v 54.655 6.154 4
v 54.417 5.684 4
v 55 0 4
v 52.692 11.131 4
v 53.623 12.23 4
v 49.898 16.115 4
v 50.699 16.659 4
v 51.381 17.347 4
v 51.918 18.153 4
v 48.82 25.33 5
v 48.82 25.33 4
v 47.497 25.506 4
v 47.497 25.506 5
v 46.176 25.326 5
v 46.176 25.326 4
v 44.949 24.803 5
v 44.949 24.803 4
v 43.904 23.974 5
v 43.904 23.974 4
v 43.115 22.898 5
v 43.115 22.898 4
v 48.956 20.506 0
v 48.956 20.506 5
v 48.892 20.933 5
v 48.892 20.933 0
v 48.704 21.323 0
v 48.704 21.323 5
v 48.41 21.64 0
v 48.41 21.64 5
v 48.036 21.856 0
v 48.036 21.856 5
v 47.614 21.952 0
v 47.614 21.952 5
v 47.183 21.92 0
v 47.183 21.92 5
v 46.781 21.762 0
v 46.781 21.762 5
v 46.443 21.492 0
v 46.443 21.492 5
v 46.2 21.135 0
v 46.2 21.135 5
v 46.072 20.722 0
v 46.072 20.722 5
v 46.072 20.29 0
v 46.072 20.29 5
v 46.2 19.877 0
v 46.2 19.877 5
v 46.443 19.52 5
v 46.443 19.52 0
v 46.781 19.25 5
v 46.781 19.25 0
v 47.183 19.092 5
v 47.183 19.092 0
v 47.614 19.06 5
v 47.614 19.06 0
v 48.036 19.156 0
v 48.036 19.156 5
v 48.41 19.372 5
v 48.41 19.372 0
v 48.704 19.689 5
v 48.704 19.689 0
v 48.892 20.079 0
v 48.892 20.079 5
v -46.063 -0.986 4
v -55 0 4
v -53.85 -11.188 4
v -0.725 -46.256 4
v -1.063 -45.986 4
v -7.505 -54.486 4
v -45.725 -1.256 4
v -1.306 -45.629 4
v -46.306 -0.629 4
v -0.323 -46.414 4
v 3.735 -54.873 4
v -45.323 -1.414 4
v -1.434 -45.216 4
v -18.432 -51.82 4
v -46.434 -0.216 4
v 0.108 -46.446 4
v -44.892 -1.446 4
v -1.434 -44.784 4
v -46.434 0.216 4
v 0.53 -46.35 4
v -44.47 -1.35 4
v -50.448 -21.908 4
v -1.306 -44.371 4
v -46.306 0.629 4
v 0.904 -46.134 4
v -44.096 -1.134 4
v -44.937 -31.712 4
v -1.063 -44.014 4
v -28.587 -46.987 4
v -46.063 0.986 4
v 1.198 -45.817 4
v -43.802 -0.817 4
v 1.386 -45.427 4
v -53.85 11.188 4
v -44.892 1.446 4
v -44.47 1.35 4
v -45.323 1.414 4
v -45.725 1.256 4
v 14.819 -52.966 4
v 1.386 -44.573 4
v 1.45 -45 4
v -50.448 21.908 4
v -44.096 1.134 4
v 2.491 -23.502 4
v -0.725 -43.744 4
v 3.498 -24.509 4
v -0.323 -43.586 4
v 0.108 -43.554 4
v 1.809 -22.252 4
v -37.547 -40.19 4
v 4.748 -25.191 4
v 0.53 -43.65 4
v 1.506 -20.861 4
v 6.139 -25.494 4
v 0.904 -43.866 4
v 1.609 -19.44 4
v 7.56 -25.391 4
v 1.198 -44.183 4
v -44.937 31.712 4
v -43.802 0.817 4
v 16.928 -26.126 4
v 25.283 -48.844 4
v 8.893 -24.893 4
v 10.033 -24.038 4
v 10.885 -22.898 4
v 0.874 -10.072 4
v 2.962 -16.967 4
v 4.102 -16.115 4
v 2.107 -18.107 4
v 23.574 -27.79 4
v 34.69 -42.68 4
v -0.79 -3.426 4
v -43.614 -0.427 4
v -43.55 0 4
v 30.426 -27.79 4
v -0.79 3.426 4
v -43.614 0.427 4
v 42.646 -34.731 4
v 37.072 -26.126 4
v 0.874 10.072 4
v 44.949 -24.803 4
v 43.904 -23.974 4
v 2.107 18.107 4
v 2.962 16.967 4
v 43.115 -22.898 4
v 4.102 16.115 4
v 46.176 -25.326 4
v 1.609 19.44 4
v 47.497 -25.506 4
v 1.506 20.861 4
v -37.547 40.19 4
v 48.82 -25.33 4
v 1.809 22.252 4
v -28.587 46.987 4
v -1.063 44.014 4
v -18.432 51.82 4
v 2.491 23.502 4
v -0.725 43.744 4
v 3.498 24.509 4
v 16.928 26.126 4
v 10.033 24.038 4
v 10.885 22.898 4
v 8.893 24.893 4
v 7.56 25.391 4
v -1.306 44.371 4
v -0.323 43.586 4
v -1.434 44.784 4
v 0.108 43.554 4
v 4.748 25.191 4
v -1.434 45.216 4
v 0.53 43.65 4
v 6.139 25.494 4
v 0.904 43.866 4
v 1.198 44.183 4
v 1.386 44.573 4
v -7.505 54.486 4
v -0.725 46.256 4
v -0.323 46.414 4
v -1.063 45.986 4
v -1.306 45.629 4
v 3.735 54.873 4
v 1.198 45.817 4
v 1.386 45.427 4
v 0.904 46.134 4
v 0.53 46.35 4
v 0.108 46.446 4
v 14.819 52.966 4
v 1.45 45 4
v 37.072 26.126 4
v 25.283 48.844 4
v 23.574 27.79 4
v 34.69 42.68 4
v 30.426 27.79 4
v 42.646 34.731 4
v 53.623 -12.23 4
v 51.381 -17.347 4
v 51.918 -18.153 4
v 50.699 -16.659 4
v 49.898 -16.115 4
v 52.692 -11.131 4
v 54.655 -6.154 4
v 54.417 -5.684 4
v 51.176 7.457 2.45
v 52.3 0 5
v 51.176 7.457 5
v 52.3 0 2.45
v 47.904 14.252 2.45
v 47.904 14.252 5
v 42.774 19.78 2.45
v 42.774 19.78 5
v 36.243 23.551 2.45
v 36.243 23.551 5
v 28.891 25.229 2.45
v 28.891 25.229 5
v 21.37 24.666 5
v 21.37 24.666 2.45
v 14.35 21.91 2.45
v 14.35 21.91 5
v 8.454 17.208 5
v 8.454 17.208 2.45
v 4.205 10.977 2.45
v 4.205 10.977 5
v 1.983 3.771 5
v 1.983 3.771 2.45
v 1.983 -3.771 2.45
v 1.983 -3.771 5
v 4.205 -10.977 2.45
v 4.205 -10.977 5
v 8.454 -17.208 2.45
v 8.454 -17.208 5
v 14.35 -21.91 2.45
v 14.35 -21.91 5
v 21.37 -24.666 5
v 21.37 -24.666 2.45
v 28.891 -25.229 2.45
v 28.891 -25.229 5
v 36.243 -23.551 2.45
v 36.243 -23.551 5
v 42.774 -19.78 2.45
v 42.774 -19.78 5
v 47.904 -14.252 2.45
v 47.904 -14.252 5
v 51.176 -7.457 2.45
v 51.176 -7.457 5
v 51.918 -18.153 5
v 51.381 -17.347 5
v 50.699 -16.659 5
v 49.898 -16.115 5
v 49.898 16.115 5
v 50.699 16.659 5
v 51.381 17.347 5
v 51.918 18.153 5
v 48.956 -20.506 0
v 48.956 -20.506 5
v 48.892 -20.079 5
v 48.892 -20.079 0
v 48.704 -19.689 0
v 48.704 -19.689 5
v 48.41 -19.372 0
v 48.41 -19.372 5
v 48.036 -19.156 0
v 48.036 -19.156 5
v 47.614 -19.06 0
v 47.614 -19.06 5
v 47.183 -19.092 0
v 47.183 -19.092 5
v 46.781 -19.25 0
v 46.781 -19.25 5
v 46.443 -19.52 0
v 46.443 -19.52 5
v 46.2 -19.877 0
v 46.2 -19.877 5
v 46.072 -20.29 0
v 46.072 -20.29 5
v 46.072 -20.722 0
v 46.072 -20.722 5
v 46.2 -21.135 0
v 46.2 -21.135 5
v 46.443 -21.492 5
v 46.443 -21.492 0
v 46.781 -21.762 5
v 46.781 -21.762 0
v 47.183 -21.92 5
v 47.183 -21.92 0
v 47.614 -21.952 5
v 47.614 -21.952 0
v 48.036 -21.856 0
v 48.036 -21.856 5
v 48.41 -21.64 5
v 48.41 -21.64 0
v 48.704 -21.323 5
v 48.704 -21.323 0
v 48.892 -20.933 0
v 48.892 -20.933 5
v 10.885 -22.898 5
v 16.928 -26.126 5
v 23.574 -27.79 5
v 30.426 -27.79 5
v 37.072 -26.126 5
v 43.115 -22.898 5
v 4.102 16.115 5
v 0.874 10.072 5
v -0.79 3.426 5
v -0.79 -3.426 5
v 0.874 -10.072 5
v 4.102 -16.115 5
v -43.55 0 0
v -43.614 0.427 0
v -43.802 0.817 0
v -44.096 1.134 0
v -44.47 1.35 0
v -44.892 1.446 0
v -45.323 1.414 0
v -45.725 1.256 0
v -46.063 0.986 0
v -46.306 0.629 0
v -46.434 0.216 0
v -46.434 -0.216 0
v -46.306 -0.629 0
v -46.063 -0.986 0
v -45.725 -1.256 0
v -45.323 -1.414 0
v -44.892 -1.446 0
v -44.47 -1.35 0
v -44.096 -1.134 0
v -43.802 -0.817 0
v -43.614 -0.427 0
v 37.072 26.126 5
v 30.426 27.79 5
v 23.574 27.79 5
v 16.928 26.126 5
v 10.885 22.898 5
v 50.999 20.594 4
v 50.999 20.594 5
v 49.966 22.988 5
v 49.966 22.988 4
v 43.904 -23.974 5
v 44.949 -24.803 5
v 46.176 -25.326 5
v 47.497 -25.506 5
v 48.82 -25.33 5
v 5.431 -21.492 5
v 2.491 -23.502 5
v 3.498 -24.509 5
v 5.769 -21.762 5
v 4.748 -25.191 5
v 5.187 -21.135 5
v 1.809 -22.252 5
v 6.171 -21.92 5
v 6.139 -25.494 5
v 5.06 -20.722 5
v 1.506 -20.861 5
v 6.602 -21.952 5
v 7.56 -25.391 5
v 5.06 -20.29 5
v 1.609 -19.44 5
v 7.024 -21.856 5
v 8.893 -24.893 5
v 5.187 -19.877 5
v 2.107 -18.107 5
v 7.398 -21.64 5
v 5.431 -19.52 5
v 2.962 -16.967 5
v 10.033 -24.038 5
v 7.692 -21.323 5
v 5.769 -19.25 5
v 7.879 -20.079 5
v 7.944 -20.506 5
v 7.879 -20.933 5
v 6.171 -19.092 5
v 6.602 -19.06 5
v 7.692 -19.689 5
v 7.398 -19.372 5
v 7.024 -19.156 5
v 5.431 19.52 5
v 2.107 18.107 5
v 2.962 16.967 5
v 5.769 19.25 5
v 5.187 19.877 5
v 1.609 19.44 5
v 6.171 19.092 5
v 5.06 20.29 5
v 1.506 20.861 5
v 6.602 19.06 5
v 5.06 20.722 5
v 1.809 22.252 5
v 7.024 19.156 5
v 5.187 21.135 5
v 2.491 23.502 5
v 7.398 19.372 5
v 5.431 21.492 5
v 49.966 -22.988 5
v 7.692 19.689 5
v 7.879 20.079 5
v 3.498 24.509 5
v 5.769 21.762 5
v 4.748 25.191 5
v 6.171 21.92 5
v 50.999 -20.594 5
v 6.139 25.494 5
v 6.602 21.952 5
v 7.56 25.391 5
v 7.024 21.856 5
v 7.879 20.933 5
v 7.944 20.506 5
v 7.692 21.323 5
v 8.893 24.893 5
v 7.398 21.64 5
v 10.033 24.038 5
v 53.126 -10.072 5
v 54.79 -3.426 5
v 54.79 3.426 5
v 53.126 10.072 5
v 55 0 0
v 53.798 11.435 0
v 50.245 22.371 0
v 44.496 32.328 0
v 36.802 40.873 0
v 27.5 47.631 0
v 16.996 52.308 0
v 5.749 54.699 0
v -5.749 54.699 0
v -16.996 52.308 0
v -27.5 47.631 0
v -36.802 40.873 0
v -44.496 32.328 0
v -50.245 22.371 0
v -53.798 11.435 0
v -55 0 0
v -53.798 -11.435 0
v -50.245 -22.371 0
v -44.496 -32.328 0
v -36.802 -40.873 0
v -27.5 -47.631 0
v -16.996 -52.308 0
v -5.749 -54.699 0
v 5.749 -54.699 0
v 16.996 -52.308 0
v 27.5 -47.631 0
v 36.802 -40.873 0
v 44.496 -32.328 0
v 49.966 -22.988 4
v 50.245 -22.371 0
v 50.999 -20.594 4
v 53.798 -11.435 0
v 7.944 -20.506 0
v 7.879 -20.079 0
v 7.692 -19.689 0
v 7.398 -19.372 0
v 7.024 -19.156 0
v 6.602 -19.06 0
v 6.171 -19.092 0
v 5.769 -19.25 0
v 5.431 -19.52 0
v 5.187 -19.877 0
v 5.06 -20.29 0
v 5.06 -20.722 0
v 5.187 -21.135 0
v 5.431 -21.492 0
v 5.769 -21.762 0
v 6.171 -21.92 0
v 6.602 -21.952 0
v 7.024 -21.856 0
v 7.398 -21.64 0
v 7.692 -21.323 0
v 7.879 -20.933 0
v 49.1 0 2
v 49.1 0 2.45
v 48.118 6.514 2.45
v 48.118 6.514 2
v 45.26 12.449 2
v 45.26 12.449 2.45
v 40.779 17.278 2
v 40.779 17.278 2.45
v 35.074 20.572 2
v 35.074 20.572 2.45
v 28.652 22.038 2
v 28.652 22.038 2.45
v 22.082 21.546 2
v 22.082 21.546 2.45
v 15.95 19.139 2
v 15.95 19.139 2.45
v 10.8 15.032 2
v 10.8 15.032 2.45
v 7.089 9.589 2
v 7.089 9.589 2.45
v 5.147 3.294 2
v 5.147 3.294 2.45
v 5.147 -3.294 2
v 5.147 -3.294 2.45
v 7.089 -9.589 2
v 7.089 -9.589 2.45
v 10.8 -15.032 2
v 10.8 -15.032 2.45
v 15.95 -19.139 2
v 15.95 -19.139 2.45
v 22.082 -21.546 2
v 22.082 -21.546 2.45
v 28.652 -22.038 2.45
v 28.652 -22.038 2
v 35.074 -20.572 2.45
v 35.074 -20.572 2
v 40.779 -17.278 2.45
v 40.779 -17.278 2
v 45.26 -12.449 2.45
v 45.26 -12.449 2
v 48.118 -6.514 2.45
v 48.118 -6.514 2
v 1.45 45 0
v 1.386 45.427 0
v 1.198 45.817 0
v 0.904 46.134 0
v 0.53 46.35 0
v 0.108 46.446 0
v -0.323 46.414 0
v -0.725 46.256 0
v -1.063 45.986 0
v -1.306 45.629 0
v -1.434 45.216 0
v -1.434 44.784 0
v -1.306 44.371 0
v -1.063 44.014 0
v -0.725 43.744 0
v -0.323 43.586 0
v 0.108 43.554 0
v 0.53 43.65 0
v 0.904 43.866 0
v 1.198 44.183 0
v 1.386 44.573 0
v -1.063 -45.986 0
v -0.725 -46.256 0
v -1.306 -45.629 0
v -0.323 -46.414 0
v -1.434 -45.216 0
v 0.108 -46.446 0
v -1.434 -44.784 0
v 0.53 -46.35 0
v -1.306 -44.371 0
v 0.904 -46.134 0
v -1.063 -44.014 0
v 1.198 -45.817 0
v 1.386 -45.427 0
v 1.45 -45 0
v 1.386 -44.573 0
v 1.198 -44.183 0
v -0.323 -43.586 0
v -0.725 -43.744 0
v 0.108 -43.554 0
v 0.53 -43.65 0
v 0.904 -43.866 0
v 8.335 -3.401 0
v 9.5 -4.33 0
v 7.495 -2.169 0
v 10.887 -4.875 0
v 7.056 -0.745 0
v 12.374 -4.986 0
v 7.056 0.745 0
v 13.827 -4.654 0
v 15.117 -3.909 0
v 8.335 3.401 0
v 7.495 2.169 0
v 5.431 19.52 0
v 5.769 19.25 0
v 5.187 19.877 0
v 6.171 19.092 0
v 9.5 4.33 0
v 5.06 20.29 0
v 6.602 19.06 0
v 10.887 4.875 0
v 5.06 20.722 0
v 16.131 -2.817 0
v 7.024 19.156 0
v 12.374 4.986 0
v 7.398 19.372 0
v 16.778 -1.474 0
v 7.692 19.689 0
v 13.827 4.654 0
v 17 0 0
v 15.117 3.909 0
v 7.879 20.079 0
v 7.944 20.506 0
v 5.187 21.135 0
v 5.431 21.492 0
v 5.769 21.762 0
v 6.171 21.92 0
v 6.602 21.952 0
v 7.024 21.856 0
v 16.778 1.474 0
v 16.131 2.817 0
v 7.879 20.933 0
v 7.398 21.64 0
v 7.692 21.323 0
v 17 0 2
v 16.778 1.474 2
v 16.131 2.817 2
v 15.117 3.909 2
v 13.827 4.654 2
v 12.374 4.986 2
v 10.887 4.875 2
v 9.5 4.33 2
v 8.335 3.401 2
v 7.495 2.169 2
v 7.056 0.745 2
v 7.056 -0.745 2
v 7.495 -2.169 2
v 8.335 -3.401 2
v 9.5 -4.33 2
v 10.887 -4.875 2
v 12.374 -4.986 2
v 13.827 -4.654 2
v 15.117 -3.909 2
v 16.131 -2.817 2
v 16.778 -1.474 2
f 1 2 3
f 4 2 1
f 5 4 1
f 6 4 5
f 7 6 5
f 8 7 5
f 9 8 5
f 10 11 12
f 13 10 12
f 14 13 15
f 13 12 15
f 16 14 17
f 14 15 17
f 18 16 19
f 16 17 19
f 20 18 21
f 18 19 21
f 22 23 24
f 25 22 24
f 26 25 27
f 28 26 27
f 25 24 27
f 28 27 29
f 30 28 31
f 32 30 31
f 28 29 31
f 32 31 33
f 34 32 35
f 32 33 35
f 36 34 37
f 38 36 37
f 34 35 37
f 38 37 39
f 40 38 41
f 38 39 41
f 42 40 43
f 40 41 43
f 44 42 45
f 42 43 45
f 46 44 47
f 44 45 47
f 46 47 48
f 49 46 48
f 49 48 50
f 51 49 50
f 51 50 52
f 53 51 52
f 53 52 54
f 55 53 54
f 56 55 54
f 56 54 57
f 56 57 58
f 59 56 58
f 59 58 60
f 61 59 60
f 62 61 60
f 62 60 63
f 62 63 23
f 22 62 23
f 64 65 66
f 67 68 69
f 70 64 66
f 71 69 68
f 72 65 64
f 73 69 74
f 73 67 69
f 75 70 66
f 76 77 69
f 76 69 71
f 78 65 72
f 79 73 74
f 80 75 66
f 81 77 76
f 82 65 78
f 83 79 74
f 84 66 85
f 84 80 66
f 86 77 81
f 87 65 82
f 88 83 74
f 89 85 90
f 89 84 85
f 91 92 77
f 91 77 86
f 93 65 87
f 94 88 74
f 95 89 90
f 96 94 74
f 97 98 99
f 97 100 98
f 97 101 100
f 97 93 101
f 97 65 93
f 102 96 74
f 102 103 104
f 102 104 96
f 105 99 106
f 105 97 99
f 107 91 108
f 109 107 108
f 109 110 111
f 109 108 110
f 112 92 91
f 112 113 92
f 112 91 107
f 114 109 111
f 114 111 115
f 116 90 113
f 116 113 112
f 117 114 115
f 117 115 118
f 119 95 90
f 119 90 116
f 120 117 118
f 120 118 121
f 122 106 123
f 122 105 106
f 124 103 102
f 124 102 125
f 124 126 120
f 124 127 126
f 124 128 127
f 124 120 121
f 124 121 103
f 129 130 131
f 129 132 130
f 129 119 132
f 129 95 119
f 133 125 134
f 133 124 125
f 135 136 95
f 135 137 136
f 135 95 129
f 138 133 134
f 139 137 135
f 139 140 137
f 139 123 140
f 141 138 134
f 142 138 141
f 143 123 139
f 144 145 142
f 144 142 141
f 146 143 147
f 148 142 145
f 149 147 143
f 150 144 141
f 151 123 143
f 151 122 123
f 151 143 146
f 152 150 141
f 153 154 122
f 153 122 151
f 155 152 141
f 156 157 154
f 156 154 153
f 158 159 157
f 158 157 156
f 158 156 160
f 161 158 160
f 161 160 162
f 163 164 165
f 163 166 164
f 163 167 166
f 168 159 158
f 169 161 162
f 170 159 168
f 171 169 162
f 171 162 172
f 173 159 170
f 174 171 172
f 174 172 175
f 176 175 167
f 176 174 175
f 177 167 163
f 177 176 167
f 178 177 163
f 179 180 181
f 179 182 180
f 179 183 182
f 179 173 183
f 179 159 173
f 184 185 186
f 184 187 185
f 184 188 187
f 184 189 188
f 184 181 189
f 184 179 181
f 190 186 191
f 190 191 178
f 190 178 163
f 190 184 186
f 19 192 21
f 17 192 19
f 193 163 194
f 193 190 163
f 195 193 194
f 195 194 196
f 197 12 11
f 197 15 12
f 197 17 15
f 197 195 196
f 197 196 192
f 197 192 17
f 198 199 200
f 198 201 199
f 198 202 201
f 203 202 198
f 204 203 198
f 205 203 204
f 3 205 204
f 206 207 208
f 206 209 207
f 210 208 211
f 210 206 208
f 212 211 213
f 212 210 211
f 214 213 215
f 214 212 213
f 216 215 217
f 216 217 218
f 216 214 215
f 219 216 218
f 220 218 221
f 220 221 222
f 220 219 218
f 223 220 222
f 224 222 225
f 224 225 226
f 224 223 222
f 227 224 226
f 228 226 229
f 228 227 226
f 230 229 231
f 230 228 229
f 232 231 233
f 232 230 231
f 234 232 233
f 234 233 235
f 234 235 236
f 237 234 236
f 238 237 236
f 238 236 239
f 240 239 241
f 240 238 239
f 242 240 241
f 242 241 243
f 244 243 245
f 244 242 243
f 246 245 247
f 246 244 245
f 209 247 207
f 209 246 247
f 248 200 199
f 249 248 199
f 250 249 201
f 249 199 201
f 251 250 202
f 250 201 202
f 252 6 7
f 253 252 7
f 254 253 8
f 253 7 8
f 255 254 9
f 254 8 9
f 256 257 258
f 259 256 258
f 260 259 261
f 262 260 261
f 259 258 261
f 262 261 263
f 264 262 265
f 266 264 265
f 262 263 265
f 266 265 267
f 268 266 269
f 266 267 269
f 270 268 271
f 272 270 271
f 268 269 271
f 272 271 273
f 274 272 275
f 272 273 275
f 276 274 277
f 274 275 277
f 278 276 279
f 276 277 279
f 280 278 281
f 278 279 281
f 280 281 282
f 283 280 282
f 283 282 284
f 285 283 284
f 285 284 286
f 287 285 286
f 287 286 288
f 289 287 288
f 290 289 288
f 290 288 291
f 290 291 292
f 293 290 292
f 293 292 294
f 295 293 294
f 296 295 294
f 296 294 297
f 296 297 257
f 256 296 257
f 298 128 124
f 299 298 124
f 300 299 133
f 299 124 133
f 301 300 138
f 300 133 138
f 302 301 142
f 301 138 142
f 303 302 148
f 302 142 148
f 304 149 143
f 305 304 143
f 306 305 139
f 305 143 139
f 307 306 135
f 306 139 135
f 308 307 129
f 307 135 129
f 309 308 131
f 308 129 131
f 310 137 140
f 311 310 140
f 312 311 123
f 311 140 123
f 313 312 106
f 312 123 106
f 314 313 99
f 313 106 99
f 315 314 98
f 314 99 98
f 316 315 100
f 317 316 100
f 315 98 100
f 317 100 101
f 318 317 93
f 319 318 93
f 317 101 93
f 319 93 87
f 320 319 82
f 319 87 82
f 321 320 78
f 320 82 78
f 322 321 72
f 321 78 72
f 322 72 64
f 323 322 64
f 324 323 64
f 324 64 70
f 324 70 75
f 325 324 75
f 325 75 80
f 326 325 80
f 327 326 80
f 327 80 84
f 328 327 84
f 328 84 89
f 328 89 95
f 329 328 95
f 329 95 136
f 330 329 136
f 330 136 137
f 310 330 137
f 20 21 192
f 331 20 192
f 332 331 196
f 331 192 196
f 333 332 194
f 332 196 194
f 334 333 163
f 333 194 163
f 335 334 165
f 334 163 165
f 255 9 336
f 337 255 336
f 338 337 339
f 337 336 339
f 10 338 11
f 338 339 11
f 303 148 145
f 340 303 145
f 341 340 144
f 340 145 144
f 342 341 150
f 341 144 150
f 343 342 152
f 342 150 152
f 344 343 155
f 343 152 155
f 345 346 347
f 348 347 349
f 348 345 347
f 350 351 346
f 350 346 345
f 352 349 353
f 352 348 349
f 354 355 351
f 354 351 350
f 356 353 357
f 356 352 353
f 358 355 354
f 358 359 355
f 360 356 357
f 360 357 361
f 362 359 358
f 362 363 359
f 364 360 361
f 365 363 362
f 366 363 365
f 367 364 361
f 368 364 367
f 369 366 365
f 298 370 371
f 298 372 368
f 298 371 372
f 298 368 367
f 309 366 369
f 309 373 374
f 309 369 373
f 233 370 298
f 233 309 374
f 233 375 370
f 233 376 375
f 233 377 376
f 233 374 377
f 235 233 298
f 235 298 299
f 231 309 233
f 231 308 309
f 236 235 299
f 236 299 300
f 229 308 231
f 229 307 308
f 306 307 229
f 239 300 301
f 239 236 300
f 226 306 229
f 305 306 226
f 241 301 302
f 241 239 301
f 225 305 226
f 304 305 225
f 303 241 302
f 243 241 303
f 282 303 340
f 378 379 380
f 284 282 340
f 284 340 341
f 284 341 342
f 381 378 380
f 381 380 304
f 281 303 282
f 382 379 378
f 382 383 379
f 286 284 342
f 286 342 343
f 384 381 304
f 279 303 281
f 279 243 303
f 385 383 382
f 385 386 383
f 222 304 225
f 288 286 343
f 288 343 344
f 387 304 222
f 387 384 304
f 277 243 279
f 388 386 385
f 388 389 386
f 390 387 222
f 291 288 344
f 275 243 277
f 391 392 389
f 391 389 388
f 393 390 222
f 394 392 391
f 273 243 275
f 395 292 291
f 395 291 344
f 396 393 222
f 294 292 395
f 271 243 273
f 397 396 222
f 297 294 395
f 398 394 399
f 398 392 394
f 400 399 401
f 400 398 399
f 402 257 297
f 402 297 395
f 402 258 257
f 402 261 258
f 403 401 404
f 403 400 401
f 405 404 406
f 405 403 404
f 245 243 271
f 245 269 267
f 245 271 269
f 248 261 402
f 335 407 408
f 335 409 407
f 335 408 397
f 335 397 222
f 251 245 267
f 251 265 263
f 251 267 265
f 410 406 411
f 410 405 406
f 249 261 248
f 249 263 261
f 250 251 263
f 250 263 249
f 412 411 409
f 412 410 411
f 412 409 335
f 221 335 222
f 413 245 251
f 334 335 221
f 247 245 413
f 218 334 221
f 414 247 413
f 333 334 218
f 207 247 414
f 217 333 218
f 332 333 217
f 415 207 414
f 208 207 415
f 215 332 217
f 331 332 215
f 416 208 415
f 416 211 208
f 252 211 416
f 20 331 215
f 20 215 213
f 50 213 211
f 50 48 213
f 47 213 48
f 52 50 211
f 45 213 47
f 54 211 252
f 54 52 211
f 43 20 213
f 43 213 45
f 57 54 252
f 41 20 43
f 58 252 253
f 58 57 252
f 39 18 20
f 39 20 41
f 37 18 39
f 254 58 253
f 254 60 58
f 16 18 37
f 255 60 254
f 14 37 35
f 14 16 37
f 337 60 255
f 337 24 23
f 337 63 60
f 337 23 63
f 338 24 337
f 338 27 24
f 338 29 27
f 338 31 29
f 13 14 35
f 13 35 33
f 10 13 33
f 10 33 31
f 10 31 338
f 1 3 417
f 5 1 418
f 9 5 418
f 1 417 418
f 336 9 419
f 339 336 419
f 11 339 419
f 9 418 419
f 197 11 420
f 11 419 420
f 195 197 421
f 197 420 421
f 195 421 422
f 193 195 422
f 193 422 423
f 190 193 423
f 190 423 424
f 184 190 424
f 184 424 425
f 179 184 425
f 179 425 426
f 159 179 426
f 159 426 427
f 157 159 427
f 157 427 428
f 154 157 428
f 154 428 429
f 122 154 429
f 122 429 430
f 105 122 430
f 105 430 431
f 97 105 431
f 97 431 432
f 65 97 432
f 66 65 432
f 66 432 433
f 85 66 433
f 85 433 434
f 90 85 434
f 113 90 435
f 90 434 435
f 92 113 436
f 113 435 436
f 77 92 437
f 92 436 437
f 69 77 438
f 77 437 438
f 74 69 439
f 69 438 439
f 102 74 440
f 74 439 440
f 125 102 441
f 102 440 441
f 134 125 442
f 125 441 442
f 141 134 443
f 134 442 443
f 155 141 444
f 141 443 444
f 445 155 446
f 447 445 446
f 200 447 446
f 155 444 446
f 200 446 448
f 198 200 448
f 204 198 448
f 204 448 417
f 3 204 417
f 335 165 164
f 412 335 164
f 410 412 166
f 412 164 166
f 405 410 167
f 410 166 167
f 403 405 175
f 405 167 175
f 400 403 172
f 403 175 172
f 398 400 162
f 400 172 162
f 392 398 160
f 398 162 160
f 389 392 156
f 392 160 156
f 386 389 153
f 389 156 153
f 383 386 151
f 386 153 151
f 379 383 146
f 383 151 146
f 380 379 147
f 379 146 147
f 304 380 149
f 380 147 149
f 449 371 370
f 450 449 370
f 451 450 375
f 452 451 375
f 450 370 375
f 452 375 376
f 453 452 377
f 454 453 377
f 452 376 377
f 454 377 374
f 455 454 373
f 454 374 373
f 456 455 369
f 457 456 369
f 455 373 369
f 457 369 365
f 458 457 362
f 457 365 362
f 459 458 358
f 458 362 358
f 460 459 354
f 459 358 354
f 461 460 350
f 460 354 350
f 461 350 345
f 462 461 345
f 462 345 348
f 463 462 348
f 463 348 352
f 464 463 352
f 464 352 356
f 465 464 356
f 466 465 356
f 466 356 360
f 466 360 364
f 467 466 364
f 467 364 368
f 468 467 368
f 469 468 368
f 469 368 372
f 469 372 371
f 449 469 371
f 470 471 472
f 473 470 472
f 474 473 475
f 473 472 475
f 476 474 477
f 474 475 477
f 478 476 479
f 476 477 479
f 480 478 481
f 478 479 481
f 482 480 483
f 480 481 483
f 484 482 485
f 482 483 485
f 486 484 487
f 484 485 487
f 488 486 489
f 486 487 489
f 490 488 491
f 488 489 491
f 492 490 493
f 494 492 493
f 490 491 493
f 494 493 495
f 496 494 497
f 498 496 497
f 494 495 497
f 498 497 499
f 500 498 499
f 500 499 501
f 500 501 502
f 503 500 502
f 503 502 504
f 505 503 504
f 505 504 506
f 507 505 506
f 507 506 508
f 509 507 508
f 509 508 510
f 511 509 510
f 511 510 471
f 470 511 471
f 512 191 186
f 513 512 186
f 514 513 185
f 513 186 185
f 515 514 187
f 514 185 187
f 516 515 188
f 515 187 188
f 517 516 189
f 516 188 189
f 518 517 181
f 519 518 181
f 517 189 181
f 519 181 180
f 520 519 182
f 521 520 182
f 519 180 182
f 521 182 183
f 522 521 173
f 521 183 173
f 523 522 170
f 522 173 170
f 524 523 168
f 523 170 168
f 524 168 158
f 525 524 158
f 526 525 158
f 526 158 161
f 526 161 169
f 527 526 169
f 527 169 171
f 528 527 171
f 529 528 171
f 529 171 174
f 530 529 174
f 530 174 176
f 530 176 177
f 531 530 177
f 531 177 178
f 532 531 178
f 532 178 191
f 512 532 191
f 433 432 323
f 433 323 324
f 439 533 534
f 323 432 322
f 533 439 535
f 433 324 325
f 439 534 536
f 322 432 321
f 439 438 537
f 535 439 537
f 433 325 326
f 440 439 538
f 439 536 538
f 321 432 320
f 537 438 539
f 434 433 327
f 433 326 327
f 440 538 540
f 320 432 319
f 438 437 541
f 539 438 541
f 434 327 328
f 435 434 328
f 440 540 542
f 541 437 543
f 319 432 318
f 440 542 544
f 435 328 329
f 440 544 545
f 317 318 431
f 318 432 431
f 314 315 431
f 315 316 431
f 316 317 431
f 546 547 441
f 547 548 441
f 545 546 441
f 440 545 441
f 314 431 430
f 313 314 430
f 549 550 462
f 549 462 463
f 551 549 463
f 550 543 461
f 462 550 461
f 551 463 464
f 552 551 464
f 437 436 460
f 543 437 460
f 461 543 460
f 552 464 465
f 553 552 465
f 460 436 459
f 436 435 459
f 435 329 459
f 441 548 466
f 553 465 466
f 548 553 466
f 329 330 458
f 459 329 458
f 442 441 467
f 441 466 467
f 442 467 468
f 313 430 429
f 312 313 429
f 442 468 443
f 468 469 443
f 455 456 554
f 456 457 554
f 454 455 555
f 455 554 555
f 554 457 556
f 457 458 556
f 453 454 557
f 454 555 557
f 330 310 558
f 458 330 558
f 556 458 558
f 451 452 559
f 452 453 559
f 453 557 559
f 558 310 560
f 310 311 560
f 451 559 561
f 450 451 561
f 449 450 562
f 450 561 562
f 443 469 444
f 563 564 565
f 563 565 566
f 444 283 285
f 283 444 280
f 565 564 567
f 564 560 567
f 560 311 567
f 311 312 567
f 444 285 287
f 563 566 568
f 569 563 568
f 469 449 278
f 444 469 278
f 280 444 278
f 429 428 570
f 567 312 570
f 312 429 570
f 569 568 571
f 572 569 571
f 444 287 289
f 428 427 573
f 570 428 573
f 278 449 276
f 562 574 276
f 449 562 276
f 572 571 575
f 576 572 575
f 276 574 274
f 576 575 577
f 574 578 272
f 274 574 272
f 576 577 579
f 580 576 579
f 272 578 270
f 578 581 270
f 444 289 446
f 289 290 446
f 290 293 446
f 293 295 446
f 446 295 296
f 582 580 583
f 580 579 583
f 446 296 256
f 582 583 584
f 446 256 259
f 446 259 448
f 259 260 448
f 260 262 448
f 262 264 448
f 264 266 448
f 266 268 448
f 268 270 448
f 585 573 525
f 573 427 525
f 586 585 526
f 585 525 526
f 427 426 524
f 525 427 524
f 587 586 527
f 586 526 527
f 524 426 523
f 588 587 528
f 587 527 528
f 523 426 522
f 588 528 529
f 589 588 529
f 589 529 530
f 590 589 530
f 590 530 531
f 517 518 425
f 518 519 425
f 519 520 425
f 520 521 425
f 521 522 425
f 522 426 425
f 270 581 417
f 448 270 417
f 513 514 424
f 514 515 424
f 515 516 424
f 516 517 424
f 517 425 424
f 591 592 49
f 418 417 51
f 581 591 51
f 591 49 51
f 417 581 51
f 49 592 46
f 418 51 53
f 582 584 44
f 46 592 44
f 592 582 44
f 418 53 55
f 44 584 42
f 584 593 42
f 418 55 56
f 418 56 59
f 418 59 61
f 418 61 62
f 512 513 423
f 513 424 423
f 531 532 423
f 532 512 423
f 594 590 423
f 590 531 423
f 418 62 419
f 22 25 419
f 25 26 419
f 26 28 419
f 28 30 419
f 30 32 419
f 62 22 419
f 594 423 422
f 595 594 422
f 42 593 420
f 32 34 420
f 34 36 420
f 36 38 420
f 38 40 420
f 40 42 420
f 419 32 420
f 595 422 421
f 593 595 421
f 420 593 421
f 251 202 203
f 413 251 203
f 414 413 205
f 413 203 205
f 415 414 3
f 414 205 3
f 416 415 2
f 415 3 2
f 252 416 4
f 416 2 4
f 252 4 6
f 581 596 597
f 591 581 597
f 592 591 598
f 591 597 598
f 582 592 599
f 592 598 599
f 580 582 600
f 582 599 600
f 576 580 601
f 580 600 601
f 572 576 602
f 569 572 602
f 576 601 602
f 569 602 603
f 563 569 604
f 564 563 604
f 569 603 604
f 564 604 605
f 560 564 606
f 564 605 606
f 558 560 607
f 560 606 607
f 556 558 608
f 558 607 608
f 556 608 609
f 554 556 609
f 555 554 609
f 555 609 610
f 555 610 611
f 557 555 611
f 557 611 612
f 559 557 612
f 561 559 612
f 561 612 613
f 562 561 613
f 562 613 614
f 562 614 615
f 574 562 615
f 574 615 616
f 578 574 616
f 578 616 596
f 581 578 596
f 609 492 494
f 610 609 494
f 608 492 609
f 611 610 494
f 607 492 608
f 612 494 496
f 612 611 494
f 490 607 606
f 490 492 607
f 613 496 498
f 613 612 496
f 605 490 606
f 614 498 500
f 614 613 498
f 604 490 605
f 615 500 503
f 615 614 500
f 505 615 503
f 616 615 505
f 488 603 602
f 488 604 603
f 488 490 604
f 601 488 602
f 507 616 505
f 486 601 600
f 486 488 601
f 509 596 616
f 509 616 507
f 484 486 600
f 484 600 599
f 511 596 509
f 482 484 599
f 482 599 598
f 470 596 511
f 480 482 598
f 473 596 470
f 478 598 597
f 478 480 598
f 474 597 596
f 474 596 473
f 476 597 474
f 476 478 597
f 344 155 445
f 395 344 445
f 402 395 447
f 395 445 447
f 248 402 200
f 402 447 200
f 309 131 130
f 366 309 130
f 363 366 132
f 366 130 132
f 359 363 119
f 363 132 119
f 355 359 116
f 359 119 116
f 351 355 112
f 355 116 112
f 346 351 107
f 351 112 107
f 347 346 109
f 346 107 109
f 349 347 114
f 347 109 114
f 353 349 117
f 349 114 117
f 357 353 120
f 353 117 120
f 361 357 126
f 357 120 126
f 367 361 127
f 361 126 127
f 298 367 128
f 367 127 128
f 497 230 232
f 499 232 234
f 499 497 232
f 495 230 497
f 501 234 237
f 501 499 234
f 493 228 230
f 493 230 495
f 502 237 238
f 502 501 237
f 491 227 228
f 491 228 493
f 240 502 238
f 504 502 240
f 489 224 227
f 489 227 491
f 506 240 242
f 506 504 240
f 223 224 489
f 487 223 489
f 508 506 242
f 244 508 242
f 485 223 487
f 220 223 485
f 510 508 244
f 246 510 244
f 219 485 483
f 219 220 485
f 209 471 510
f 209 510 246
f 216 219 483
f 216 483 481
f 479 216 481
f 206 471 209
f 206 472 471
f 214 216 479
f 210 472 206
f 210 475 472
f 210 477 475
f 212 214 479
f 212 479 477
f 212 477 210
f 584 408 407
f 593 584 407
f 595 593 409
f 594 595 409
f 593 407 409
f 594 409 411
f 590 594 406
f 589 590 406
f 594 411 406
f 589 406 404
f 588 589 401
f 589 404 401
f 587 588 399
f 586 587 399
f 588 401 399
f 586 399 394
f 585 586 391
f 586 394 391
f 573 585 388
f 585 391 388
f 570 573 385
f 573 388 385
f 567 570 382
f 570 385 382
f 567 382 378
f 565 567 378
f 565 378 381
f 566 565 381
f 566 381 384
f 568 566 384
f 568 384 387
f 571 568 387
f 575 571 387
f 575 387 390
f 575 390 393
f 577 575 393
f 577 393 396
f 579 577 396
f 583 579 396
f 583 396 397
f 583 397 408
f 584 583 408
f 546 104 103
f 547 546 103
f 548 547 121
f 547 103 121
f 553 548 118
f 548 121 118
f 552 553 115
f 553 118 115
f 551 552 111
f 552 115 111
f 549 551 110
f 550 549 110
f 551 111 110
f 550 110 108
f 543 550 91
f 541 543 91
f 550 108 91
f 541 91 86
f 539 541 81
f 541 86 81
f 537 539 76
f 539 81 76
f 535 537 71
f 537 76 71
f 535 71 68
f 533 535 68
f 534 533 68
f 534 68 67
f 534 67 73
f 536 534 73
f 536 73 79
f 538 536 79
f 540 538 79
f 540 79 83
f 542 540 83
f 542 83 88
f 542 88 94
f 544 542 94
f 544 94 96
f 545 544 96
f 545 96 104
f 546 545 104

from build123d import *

# Parameters (mm, degrees)
F0_R      = 55
F1_DEPTH  = 4
F2_R      = 22.1
F3_DEPTH  = 2
F4_R      = 25.3
F4_R_2    = 22.1
F5_DEPTH  = 1.55
F6_R      = 28
F6_R_2    = 25.3
F7_DEPTH  = 1
F8_R      = 5
F9_DEPTH  = 25
F11_DEPTH = 1
F12_R     = 1.45
F13_DEPTH = 25
F14_R     = 1.45
F15_DEPTH = 25


with BuildPart() as f1:
    # F0 (on Top) → F1 (new body)
    with BuildSketch(Plane.XY):
        Circle(F0_R)
    extrude(amount=F1_DEPTH)

    # F2 (on face) → F3 (cut)
    with BuildSketch(Plane.XY.offset(4)):
        with Locations((27, 0)):
            Circle(F2_R)
    extrude(amount=-F3_DEPTH, mode=Mode.SUBTRACT)

    # F4 (on face) → F5 (cut)
    with BuildSketch(Plane.XY.offset(4)):
        with Locations((27, 0)):
            Circle(F4_R)
        with Locations((27, 0)):
            Circle(F4_R_2, mode=Mode.SUBTRACT)
    extrude(amount=-F5_DEPTH, mode=Mode.SUBTRACT)

    # F6 (on face) → F7 (join)
    with BuildSketch(Plane.XY.offset(4)):
        with Locations((27, 0)):
            Circle(F6_R)
        with Locations((27, 0)):
            Circle(F6_R_2, mode=Mode.SUBTRACT)
    extrude(amount=F7_DEPTH)

    # F8 (on face) → F9 (cut)
    with BuildSketch(Plane.XY.offset(2)):
        with Locations((12, 0)):
            Circle(F8_R)
    extrude(amount=-F9_DEPTH, mode=Mode.SUBTRACT)

    # F10 (on face) → F11 (join)
    with BuildSketch(Plane.XY.offset(4)):
        with BuildLine():
            ThreePointArc((10.8848586854, -22.8976466129), (7.2010101268, -19.7989898732), (4.1023533871, -16.1151413146))
            ThreePointArc((4.1023533871, -16.1151413146), (2.9583694397, -24.0416305603), (10.8848586854, -22.8976466129))
        make_face()
        with BuildLine():
            ThreePointArc((10.8848586854, 22.8976466129), (2.9583694397, 24.0416305603), (4.1023533871, 16.1151413146))
            ThreePointArc((4.1023533871, 16.1151413146), (7.2010101268, 19.7989898732), (10.8848586854, 22.8976466129))
        make_face()
        with BuildLine():
            ThreePointArc((49.8976466129, -16.1151413146), (46.7989898732, -19.7989898732), (43.1151413146, -22.8976466129))
            ThreePointArc((43.1151413146, -22.8976466129), (45.5447053375, -25.105329645), (48.8197581332, -25.3304404978))
            ThreePointArc((48.8197581332, -25.3304404978), (50.4964850216, -21.7969034605), (51.917853321, -18.1531404043))
            ThreePointArc((51.917853321, -18.1531404043), (51.0570972643, -16.9860974117), (49.8976466129, -16.1151413146))
        make_face()
        with BuildLine():
            ThreePointArc((48.8197581332, 25.3304404978), (45.5447053375, 25.105329645), (43.1151413146, 22.8976466129))
            ThreePointArc((43.1151413146, 22.8976466129), (46.7989898732, 19.7989898732), (49.8976466129, 16.1151413146))
            ThreePointArc((49.8976466129, 16.1151413146), (51.0570972643, 16.9860974117), (51.917853321, 18.1531404043))
            ThreePointArc((51.917853321, 18.1531404043), (50.4964850216, 21.7969034605), (48.8197581332, 25.3304404978))
        make_face()
    extrude(amount=F11_DEPTH)

    # F12 (on face) → F13 (cut)
    with BuildSketch(Plane.XY.offset(5)):
        with Locations((6.4939033456, 20.5060966544)):
            Circle(F12_R)
        with Locations((47.5060966544, 20.5060966544)):
            Circle(F12_R)
        with Locations((47.5060966544, -20.5060966544)):
            Circle(F12_R)
        with Locations((6.4939033456, -20.5060966544)):
            Circle(F12_R)
    extrude(amount=-F13_DEPTH, mode=Mode.SUBTRACT)

    # F14 (on face) → F15 (cut)
    with BuildSketch(Plane.XY.offset(4)):
        with Locations((0, 45)):
            Circle(F14_R)
        with Locations((-45, 0)):
            Circle(F14_R)
        with Locations((0, -45)):
            Circle(F14_R)
    extrude(amount=-F15_DEPTH, mode=Mode.SUBTRACT)


solid = f1.part
